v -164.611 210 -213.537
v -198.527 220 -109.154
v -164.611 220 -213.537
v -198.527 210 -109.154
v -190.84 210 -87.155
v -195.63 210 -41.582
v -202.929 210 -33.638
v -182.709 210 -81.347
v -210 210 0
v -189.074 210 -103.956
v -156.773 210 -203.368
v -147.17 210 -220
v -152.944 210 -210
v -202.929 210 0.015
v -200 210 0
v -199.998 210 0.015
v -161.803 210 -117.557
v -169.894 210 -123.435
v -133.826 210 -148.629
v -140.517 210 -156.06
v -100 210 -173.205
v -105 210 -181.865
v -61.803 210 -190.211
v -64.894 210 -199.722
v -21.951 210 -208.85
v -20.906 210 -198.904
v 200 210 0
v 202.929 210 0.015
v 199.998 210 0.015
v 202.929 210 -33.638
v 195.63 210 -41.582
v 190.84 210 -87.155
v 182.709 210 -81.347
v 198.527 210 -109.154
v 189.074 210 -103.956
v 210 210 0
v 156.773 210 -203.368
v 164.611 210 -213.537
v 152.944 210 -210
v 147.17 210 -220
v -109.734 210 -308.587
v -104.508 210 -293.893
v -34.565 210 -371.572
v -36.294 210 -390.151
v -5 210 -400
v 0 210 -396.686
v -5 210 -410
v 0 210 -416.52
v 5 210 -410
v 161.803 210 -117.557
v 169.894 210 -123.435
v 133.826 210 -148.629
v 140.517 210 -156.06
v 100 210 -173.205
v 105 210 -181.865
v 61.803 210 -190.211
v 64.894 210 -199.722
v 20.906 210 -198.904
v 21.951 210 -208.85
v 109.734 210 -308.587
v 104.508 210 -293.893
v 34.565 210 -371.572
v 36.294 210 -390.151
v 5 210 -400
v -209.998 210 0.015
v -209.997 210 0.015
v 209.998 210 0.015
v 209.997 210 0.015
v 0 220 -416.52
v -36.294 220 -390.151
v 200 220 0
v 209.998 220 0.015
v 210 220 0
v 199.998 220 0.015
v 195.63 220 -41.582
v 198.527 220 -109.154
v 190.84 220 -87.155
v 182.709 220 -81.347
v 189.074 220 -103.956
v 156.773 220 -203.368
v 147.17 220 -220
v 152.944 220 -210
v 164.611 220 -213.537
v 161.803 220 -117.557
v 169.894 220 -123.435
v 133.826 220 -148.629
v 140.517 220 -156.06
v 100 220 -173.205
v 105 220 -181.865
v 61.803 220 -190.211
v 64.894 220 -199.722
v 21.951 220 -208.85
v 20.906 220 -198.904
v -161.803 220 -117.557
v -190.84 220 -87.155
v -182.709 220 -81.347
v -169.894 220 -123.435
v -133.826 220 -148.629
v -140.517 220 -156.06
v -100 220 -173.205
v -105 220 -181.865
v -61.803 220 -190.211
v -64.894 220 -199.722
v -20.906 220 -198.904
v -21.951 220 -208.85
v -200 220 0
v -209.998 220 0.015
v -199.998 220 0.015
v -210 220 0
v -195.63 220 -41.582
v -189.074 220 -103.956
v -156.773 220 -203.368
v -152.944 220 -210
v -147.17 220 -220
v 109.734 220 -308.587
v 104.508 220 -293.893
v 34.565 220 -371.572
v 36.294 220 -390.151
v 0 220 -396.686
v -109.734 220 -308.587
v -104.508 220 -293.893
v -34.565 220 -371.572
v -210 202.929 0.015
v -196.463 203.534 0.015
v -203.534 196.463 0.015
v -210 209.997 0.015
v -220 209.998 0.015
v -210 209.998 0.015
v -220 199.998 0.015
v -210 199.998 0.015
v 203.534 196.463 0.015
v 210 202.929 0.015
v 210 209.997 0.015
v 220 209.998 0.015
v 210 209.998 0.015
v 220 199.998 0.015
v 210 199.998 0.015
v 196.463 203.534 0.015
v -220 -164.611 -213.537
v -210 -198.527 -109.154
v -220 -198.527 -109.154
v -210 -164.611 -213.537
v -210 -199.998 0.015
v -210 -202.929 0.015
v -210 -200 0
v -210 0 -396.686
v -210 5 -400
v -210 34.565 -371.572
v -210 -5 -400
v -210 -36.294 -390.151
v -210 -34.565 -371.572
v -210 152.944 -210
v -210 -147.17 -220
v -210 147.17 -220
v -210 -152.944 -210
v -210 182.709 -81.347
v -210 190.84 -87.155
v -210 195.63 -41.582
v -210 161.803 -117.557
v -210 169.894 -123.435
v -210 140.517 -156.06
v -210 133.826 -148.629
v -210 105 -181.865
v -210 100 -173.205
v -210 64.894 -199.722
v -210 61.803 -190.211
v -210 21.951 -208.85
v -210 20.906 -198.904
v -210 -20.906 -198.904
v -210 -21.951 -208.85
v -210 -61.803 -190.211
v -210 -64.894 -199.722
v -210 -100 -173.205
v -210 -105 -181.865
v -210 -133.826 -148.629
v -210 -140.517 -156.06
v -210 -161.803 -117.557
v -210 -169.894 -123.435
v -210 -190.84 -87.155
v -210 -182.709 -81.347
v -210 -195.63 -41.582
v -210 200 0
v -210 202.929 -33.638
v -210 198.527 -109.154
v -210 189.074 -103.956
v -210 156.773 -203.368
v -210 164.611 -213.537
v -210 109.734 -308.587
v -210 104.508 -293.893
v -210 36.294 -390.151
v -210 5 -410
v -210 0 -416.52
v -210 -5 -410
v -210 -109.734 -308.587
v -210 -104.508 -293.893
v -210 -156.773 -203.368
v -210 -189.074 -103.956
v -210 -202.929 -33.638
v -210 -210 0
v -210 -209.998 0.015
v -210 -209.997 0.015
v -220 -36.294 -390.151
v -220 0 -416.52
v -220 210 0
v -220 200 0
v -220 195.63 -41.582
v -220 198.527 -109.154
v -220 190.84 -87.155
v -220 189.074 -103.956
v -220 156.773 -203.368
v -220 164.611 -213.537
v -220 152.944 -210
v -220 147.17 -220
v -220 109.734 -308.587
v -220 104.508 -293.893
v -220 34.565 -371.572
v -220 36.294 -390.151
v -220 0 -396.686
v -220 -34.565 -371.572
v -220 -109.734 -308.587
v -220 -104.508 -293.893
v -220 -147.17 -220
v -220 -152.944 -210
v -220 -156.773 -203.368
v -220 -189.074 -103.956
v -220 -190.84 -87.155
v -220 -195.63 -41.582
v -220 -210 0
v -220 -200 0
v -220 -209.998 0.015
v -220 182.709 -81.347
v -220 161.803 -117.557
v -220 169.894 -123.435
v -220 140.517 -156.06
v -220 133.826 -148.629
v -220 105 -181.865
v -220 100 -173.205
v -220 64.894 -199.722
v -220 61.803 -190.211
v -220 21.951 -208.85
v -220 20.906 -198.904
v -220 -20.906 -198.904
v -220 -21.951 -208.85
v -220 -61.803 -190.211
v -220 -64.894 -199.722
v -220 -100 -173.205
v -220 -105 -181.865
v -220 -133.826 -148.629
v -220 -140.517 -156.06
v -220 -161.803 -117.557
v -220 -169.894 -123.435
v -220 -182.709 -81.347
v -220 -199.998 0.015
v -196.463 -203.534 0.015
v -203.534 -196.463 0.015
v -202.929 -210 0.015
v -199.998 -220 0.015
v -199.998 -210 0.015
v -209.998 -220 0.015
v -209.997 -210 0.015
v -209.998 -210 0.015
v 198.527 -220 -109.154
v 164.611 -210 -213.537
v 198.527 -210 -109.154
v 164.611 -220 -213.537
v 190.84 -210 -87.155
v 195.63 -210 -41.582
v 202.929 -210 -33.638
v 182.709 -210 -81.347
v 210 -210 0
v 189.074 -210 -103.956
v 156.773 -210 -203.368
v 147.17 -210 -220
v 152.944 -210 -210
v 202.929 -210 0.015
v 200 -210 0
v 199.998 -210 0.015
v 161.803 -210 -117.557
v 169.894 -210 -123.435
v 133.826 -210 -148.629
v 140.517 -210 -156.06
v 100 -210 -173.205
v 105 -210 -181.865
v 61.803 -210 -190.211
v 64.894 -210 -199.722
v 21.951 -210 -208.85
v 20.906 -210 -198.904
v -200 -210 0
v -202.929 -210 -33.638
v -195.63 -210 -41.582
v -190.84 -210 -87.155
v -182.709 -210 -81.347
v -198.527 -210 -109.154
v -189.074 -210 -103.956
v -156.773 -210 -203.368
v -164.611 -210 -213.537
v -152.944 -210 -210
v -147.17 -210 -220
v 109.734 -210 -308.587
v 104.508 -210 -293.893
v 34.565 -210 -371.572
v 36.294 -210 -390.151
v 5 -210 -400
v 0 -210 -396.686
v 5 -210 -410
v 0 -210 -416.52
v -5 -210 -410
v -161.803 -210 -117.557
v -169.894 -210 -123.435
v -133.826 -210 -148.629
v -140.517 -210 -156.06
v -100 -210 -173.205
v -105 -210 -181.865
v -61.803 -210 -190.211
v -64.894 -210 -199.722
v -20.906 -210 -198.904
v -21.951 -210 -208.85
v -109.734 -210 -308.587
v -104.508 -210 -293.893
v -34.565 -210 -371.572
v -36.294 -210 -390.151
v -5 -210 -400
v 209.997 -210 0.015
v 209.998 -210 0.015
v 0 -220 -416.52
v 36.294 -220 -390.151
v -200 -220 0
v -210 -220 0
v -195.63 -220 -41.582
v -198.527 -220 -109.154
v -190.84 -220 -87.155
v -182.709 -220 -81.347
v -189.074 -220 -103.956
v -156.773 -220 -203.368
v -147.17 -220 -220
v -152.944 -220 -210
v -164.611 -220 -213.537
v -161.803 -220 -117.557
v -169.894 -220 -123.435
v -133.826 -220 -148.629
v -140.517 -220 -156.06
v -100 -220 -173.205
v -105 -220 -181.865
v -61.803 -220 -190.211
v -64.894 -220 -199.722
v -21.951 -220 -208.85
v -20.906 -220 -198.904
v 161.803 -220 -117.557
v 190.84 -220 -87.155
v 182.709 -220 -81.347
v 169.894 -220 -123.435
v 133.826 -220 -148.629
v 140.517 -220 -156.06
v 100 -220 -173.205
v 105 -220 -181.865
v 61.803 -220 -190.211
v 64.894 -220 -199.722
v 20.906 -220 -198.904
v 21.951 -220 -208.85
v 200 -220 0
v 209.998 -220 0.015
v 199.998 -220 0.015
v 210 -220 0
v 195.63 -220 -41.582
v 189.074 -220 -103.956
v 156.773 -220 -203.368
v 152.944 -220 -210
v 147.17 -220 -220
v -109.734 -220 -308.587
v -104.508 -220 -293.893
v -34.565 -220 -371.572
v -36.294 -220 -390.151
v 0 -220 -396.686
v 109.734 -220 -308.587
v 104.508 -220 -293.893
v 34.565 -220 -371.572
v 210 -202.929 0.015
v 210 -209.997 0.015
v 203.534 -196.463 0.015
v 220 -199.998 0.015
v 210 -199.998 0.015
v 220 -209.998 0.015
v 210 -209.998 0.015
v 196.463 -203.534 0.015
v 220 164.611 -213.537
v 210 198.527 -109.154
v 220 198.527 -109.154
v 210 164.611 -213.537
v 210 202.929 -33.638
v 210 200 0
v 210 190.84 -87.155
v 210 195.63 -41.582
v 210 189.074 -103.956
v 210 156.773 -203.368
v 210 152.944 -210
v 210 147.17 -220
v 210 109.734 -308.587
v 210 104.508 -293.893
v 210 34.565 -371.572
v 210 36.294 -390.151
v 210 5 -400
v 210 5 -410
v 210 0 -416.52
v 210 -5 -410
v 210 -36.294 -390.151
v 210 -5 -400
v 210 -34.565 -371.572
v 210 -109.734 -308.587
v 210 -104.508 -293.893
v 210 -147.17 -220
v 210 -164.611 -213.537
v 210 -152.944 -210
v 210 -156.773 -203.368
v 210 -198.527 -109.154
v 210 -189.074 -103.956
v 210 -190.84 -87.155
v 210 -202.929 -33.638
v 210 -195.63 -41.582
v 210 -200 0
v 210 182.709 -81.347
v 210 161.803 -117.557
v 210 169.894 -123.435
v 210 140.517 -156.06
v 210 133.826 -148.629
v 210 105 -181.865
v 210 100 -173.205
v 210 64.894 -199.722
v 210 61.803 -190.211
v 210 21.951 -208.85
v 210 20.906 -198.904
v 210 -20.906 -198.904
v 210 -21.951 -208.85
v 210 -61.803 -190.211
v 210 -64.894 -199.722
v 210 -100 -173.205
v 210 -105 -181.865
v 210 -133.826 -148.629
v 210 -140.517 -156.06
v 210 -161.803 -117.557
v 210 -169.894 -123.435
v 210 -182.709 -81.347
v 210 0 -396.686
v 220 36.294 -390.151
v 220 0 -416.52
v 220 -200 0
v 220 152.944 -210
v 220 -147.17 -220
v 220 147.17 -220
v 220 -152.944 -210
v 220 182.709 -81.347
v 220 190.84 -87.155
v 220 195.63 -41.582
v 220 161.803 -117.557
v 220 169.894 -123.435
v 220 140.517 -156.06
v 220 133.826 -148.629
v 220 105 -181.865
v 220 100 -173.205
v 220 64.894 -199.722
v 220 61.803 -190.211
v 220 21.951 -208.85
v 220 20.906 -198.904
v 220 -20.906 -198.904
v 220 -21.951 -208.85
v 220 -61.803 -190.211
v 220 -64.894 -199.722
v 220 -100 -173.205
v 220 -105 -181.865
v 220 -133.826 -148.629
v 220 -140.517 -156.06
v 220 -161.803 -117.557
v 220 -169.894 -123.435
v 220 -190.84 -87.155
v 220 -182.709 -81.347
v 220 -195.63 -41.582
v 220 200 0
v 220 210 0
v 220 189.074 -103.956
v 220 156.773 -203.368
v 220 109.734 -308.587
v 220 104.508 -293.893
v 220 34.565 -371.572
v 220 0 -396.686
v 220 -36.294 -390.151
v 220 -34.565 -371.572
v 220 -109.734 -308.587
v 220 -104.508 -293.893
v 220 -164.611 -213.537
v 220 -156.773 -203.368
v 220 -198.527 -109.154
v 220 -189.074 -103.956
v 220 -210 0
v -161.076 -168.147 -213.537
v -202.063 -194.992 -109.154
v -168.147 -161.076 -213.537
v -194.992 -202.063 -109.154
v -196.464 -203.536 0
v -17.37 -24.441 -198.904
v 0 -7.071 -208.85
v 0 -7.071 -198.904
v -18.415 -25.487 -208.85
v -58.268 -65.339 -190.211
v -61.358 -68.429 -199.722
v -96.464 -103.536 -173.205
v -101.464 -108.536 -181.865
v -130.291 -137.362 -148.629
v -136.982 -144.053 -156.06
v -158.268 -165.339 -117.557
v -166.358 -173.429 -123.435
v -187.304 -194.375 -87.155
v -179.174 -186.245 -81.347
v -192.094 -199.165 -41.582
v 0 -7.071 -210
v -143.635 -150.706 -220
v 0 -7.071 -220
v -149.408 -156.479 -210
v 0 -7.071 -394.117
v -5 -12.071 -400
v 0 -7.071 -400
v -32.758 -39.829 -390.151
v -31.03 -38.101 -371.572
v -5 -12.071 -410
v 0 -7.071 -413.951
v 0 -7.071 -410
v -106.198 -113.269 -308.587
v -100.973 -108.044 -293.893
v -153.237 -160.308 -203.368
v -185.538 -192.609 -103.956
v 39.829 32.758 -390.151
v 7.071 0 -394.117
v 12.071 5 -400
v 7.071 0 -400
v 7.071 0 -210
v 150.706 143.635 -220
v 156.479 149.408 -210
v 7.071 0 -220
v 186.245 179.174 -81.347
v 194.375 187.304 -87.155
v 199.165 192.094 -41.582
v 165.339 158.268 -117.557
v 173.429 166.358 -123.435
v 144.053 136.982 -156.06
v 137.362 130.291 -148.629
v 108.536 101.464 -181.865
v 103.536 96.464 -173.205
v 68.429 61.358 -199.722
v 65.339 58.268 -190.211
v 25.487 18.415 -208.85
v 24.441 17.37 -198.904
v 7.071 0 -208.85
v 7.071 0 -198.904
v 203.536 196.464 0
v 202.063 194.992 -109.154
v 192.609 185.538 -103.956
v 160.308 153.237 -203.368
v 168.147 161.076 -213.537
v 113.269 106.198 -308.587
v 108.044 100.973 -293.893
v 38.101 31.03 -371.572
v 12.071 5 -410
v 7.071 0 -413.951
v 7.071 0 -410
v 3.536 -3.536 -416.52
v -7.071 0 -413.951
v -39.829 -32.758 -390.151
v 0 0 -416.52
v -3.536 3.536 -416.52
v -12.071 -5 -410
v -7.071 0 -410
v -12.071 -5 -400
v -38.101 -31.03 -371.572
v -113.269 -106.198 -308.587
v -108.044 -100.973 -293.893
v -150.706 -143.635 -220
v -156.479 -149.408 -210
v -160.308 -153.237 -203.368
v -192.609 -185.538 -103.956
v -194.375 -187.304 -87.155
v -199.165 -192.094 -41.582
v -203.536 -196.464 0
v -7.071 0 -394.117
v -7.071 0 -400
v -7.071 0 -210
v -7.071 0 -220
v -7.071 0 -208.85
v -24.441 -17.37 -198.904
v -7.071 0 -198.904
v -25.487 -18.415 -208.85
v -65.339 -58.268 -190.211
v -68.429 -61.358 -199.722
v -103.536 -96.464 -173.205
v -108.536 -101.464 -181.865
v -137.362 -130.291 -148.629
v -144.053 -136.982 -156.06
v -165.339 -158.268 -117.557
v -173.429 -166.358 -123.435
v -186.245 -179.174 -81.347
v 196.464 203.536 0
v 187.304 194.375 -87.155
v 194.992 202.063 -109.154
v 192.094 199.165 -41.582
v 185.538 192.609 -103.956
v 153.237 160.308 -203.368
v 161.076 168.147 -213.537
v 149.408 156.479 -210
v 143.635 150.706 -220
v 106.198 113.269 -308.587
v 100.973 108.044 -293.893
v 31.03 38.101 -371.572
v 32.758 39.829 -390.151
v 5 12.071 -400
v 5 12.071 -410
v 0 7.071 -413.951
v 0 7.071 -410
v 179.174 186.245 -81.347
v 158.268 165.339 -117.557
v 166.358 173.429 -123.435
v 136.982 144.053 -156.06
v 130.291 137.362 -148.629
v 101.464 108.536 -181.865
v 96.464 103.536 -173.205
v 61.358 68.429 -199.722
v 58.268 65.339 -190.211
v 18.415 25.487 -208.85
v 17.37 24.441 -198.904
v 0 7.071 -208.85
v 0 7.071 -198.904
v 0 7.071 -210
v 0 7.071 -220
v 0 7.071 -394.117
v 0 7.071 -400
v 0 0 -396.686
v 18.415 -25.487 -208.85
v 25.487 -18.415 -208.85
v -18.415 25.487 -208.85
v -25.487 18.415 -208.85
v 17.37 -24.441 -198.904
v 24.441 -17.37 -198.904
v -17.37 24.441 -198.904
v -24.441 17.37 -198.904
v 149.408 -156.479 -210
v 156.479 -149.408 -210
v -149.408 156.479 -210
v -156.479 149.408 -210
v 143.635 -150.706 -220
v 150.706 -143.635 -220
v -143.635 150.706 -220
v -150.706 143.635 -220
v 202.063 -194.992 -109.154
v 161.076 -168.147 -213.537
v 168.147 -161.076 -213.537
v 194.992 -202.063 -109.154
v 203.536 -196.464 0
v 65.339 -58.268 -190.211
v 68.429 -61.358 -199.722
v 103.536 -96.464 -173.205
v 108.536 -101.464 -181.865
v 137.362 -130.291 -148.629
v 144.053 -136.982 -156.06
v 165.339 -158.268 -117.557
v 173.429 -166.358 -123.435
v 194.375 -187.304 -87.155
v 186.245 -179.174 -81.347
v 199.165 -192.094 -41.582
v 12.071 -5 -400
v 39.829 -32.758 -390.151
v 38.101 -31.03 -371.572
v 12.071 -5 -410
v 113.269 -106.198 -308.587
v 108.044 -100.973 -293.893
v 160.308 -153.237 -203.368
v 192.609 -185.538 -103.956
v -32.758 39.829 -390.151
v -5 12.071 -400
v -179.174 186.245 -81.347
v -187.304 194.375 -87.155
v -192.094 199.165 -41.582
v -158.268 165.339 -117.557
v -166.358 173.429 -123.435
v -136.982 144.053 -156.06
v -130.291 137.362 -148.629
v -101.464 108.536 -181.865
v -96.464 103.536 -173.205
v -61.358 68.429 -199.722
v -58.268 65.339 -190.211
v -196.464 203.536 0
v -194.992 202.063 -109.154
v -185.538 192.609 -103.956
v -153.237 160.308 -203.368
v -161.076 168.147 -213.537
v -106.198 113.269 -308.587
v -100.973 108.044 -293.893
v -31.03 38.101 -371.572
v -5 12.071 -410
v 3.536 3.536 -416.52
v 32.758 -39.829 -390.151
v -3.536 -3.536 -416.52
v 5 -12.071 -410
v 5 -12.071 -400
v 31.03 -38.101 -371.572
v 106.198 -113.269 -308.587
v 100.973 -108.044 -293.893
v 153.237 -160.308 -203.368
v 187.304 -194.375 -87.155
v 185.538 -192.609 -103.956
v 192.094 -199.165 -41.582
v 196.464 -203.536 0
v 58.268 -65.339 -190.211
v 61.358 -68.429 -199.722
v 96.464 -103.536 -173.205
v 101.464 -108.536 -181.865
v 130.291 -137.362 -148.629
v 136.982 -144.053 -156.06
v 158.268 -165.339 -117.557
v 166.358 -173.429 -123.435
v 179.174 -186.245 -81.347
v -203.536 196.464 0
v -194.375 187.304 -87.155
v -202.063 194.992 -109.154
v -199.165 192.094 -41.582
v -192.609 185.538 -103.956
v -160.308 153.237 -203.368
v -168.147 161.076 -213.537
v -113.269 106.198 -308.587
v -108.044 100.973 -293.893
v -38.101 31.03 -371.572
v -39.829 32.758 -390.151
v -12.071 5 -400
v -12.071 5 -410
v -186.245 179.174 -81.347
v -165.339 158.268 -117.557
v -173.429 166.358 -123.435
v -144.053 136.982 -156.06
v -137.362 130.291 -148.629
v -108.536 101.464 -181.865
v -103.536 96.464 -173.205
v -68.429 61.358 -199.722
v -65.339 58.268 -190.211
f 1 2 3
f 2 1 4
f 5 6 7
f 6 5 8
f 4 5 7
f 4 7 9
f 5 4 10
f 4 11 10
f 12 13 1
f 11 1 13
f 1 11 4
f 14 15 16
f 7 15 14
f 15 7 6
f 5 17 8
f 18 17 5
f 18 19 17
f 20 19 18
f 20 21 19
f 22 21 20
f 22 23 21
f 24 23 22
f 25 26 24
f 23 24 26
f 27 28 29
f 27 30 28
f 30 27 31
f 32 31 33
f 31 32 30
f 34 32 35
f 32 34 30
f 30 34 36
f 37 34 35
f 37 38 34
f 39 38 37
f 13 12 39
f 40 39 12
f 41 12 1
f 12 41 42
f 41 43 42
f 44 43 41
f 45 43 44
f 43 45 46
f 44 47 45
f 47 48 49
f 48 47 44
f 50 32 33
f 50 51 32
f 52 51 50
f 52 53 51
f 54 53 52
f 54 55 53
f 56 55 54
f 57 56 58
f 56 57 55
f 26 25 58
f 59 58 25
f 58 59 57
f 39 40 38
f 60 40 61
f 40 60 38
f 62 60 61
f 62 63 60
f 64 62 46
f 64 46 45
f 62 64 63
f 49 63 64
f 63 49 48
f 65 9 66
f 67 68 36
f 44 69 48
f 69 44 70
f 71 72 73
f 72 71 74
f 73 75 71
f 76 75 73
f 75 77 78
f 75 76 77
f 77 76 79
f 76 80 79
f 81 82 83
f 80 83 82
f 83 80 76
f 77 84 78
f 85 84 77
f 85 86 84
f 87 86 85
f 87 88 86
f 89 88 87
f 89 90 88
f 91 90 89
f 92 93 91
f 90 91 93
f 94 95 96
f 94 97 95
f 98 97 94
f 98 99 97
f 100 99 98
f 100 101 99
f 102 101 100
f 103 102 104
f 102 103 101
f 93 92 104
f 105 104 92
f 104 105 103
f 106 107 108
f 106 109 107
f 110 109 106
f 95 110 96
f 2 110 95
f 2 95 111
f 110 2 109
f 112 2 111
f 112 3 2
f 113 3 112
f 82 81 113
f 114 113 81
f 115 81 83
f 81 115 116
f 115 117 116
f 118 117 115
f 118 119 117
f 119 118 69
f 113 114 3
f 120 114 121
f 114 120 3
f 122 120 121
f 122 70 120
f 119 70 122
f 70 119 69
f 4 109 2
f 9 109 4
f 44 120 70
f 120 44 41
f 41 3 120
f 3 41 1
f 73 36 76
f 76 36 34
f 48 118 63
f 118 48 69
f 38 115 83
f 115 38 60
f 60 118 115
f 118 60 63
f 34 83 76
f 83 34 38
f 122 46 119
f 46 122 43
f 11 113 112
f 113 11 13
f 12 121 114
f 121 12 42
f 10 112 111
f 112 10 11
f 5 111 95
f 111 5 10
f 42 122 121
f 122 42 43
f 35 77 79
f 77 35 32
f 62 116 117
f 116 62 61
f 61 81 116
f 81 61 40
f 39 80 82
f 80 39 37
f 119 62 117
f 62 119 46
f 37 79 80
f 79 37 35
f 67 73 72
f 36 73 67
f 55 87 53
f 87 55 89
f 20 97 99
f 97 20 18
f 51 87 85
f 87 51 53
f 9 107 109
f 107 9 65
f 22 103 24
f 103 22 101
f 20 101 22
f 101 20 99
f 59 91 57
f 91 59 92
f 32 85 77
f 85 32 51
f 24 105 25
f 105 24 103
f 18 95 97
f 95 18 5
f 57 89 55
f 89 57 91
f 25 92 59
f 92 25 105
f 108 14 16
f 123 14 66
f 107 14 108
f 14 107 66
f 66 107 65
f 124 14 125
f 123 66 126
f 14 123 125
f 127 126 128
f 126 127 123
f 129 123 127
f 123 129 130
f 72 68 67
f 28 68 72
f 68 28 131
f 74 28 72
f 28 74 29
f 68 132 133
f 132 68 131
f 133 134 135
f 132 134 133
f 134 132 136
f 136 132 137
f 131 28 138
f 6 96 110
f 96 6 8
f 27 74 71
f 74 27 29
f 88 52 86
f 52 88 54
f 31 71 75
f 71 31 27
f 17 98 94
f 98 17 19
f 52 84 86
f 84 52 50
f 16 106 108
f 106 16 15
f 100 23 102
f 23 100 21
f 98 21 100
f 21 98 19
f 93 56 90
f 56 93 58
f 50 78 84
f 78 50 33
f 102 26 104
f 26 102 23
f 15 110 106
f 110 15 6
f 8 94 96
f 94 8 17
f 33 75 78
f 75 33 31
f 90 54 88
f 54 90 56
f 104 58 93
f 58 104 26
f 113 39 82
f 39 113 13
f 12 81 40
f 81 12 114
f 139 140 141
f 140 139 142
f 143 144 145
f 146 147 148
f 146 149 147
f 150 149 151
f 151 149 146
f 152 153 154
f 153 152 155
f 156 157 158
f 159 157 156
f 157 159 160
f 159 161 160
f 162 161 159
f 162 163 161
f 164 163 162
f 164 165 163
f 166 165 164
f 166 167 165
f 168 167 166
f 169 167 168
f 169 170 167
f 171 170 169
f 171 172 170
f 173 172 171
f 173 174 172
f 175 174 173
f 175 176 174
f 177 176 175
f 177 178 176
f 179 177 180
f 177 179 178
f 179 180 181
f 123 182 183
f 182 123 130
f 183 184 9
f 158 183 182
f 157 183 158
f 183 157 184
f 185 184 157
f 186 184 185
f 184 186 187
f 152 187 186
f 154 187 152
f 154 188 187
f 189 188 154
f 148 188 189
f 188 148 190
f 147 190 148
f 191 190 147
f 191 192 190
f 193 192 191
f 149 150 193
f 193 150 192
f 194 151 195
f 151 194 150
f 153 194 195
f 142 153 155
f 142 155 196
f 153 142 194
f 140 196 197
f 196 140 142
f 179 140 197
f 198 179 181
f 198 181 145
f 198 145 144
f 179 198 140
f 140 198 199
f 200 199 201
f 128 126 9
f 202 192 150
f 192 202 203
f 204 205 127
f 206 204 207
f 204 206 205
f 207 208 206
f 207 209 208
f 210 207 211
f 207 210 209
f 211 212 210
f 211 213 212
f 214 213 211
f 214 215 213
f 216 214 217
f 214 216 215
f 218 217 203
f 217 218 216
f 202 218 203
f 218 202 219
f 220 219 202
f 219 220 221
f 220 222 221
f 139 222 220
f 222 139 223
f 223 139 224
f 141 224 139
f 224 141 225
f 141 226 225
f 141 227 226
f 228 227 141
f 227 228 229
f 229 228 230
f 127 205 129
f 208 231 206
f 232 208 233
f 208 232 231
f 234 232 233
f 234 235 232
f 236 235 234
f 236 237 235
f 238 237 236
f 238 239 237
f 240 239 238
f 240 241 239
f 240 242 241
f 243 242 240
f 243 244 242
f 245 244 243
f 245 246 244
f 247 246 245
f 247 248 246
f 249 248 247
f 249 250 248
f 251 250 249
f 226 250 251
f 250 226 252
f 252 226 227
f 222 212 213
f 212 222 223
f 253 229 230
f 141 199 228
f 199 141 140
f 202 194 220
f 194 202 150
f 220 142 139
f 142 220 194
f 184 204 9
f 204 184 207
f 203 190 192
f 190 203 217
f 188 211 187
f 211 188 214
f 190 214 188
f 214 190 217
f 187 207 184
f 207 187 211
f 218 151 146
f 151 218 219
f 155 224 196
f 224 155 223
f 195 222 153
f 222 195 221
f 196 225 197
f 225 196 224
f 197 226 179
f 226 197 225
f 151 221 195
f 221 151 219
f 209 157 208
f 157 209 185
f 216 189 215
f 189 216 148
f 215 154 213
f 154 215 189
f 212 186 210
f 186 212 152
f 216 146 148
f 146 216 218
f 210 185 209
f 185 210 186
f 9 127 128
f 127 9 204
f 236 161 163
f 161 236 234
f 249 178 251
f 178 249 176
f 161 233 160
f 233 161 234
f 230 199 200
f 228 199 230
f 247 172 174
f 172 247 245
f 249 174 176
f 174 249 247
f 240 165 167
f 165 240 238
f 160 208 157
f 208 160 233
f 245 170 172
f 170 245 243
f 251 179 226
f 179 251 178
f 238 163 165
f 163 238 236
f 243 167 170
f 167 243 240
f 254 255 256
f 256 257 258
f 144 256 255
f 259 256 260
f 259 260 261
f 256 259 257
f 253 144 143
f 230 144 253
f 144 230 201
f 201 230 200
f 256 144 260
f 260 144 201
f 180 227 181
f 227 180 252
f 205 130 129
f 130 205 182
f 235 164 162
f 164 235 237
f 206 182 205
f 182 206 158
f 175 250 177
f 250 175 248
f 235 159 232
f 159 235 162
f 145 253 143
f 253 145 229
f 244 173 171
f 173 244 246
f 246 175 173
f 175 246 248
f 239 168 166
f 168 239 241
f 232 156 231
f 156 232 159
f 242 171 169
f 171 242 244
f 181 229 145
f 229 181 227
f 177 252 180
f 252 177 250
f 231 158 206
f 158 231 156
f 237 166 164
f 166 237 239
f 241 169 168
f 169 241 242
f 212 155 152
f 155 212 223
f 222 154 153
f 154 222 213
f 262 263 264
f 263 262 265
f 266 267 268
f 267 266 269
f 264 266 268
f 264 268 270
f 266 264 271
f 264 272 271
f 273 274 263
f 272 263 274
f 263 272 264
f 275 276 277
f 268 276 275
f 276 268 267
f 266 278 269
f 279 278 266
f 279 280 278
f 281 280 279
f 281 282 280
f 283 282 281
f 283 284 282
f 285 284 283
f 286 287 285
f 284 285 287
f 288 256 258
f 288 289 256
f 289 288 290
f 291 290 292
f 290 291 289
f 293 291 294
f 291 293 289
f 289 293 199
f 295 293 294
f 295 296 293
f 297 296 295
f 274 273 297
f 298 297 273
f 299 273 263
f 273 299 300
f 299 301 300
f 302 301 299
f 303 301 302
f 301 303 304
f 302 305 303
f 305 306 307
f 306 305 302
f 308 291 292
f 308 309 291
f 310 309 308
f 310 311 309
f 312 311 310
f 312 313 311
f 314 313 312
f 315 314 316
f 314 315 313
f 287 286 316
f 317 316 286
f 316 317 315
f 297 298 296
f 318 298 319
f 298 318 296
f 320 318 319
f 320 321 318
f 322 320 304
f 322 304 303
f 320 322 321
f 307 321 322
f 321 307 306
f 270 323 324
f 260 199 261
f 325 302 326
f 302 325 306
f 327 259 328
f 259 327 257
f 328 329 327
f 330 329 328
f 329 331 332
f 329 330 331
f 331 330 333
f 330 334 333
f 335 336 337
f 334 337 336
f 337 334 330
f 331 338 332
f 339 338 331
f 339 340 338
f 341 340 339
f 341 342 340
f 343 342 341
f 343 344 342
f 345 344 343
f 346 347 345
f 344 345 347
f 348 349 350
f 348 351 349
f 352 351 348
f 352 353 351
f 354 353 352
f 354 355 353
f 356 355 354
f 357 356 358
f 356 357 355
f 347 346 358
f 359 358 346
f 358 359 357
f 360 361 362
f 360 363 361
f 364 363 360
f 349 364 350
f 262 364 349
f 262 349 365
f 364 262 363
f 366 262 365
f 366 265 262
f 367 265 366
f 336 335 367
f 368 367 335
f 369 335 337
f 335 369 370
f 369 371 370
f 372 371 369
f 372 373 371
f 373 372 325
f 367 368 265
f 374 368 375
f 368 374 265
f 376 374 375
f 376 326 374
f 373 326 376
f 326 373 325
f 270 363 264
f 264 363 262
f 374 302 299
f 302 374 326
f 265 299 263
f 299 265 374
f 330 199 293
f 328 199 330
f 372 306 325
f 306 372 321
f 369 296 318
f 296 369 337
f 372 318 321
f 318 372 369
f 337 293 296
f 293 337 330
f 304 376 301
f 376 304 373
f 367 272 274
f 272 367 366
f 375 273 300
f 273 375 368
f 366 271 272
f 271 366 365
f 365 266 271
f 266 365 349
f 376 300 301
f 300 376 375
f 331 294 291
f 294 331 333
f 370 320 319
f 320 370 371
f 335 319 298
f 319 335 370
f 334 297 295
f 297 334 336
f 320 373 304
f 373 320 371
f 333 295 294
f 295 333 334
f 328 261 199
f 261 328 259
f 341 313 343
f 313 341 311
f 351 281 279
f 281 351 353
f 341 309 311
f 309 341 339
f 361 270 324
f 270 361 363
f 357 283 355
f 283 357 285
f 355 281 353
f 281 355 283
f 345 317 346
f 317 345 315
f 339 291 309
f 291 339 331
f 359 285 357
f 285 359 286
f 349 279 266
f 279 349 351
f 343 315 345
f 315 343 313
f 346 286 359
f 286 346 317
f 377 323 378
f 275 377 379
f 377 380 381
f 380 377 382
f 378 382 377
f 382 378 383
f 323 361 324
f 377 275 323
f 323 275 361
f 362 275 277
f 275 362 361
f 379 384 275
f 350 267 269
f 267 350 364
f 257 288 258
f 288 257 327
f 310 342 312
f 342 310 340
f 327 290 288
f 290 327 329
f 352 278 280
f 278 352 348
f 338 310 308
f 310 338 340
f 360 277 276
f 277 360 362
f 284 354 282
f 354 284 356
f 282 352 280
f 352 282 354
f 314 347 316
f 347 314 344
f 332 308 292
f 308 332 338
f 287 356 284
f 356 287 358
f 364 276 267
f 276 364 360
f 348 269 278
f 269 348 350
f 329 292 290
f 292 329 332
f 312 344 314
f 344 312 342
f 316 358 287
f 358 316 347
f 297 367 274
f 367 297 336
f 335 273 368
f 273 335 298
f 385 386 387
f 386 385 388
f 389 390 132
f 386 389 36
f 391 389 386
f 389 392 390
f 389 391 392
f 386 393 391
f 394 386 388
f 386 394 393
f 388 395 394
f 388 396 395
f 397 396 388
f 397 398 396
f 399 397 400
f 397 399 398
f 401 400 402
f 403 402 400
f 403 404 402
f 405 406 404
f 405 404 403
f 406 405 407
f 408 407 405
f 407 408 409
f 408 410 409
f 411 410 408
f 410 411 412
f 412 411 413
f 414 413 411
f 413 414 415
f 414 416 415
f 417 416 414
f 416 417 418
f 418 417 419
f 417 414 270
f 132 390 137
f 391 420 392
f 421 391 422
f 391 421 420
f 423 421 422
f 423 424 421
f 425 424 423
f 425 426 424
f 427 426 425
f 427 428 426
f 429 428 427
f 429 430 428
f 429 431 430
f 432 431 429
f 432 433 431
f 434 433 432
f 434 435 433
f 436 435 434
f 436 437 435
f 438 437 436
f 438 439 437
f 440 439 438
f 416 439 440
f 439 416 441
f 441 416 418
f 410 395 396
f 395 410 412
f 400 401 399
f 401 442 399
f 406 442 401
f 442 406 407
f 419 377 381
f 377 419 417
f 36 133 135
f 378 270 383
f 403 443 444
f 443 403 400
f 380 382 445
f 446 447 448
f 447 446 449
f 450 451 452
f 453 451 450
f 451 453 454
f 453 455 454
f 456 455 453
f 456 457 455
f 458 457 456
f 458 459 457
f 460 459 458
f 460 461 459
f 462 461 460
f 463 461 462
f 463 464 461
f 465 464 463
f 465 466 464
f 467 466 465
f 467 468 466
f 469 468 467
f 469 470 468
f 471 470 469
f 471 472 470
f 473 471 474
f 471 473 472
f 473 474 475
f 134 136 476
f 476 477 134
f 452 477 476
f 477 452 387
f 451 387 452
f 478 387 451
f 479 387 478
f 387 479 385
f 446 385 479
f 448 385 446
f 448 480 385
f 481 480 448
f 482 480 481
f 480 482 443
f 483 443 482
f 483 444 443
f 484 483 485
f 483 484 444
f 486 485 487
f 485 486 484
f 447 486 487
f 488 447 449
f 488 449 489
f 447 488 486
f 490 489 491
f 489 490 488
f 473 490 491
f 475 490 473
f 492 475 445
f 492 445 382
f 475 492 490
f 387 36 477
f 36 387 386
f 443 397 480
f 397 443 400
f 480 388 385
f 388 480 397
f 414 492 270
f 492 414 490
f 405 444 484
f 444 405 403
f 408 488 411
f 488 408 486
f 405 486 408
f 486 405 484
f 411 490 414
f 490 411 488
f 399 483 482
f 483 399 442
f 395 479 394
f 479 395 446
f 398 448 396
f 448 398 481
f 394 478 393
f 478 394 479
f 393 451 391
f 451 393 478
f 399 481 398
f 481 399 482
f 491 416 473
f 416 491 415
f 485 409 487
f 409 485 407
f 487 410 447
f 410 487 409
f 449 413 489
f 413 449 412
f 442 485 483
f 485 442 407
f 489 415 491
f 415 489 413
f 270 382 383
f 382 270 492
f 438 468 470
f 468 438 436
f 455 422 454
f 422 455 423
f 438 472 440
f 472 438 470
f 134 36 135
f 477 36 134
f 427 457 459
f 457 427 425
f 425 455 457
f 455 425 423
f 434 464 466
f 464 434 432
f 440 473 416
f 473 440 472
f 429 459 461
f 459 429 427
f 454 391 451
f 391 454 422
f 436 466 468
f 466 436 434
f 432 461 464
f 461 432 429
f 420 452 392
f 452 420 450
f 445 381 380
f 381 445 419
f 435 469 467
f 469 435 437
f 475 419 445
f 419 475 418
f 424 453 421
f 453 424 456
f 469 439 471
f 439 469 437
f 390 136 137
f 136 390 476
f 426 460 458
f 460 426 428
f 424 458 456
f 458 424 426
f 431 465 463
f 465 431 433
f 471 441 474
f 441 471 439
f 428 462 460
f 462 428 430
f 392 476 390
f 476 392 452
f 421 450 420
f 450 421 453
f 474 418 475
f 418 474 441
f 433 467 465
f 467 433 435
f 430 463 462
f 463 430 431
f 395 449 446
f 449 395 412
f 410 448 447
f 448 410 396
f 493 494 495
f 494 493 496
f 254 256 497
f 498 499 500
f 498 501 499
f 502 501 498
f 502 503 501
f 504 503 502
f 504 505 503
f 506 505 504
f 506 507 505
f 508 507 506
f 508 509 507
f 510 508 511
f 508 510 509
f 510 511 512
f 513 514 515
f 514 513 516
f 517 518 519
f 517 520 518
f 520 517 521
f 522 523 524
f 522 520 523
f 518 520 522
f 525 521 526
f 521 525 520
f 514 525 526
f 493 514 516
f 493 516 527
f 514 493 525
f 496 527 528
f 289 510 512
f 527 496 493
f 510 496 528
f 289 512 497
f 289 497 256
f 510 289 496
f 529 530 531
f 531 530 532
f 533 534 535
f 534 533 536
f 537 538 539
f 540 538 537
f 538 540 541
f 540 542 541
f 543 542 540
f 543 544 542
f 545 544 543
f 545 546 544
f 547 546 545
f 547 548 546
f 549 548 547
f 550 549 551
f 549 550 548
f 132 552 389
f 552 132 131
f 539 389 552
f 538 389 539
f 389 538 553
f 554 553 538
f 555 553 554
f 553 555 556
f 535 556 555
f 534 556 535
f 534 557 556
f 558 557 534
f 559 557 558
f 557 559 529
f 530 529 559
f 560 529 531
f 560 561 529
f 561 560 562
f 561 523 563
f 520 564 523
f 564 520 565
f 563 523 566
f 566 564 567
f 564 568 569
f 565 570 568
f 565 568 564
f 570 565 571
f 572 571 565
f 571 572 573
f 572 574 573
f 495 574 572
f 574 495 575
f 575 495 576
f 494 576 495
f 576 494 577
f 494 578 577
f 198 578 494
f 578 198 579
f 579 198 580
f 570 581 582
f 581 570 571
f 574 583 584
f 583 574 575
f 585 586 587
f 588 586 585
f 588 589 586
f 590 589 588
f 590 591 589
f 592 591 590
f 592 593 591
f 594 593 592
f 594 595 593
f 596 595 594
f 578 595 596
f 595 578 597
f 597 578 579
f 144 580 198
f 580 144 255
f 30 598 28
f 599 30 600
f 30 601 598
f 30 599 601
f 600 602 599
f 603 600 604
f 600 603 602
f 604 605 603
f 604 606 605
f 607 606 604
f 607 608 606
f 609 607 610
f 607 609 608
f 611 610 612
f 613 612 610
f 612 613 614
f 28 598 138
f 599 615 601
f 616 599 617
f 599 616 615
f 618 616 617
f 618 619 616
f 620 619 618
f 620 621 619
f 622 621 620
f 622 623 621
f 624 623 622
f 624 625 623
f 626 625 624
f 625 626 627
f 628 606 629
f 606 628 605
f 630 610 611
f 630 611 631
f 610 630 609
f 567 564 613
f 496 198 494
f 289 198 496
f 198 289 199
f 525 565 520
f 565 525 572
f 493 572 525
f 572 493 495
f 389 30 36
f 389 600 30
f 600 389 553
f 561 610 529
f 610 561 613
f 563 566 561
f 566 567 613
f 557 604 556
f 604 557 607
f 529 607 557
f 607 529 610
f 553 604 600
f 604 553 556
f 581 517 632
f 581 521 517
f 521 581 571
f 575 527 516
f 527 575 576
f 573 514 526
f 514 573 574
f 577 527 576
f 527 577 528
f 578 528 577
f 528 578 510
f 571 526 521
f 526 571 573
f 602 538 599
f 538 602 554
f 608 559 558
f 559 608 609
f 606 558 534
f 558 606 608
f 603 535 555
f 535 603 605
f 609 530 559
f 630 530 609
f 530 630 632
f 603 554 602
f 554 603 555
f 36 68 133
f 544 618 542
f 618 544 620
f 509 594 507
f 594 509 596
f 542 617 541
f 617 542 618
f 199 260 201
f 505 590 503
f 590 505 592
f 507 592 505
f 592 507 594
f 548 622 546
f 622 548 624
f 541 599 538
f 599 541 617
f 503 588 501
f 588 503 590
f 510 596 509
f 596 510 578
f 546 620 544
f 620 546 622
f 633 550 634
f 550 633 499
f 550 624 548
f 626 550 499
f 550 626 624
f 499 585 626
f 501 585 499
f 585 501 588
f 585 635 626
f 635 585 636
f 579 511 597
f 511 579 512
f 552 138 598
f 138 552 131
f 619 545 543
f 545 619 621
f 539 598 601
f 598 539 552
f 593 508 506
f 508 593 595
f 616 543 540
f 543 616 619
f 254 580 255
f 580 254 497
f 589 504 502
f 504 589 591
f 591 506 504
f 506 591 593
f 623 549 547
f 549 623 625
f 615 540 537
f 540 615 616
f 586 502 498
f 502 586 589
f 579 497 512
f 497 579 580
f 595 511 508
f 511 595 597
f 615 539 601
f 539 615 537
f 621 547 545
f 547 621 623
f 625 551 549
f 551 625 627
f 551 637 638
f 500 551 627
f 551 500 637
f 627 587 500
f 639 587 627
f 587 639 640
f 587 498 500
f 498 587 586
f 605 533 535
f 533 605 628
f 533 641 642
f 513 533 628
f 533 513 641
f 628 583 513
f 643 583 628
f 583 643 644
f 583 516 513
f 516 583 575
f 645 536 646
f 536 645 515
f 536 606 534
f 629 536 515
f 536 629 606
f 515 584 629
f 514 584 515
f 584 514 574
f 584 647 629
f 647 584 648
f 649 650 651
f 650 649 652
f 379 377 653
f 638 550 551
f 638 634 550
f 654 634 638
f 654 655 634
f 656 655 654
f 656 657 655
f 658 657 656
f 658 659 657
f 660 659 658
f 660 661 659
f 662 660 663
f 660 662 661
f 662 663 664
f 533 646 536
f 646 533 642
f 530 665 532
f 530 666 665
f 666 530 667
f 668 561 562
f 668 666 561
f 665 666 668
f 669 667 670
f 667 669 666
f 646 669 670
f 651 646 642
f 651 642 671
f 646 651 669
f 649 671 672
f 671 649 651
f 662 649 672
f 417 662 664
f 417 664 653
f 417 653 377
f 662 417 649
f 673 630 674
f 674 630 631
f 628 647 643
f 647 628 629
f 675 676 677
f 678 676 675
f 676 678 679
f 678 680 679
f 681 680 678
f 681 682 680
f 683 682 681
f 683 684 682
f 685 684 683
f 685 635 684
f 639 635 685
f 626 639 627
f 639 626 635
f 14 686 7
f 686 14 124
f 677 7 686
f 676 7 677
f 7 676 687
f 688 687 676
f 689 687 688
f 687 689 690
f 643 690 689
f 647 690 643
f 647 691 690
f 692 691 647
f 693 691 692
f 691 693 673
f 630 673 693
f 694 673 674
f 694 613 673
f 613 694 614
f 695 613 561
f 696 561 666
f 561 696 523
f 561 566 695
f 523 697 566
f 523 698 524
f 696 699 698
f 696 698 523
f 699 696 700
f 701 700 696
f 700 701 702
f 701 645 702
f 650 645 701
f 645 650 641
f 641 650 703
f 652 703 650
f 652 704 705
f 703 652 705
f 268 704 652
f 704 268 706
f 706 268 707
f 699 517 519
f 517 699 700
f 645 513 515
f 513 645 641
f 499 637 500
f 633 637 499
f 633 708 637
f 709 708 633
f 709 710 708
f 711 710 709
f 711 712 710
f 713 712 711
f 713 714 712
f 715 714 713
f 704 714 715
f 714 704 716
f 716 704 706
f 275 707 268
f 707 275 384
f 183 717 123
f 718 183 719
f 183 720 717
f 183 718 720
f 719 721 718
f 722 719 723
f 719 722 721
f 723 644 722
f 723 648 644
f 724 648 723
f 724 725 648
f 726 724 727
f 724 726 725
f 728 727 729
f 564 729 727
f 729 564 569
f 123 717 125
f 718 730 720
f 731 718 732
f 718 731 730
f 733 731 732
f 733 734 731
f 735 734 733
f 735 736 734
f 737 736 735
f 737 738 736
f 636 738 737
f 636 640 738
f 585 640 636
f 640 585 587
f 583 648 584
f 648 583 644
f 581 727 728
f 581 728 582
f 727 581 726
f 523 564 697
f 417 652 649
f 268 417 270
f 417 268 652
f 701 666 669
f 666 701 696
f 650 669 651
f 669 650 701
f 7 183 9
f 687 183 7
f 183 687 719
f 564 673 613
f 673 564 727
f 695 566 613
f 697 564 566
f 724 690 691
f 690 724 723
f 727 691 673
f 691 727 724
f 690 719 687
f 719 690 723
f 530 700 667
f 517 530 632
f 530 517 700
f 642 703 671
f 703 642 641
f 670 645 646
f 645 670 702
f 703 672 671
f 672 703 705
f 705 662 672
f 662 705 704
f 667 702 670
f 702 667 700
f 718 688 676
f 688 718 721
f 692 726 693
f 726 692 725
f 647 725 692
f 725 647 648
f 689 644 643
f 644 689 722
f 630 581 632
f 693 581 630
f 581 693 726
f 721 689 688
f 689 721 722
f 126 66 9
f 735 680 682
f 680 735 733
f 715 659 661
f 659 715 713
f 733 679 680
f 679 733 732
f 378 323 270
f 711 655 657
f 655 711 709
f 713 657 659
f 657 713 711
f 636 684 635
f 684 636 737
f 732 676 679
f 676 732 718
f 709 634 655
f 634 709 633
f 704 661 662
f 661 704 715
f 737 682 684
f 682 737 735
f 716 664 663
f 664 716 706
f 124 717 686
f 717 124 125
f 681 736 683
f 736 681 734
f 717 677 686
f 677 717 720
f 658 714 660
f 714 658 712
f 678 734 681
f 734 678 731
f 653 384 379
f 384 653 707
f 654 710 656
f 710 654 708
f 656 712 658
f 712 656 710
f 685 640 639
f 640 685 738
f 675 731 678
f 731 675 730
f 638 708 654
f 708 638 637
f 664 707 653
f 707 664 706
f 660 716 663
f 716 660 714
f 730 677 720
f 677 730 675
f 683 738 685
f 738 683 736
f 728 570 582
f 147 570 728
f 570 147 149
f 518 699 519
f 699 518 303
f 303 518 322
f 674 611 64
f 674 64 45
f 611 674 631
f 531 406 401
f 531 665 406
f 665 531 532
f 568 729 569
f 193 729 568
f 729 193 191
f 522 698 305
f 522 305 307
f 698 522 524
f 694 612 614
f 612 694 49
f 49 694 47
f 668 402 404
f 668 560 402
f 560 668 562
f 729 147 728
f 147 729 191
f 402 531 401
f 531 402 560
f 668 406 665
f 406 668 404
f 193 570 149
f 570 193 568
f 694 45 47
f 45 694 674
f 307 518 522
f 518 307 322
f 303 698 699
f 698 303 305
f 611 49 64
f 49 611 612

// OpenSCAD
// Copyright 2013 Jonathan Hulka
// This program is free software; you can redistribute it and/or modify
// it under the terms of the GNU General Public License as published by
// the Free Software Foundation; either version 2 of the License, or
// (at your option) any later version.
// 
// This program is distributed in the hope that it will be useful,
// but WITHOUT ANY WARRANTY; without even the implied warranty of
// MERCHANTABILITY or FITNESS FOR A PARTICULAR PURPOSE.  See the
// GNU General Public License for more details.
// 
// You should have received a copy of the GNU General Public License
// along with this program; if not, write to the Free Software
// Foundation, Inc., 51 Franklin Street, Fifth Floor, Boston,
// MA 02110-1301, USA.

module gothic_arch(width,depth)
{
	radius=width*5/4;
	rotate([90,0,0])intersection()
	{
		translate([radius-width/2,0,0])cylinder(h=depth,r=radius,center=true);
		translate([width/2-radius,0,0])cylinder(h=depth,r=radius,center=true);
		translate([0,-width/2-1,0])cube(size=[width+1,width+2,depth+1],center=true);
	}
}
module round_arch(width,depth)
{
	rotate([90,0,0])intersection()
	{
		cylinder(h=depth,r=width/2,center=true);
		//This will be used to cut out of the larger piece, so it extends down 0.01mm
		translate([0,-width/2-0.99,0])cube(size=[width+1,width+2.01,depth+1],center=true);
	}
}

module solid_structure(width)
{
	difference()
	{
		union()
		{
			rotate([0,0,90])gothic_arch(width+20,width+40);
			gothic_arch(width+20,width+40);
		}
		union()
		{
			rotate([0,0,90])round_arch(width,width+50);
			round_arch(width,width+50);
		}
		intersection()
		{
			union()
			{
				rotate([0,0,90])gothic_arch(width,width+50);
				gothic_arch(width,width+50);
			}
			translate([0,0,-width-40])cube(size=width+60,center=true);
		}
	}
}

module beam(width,thickness)
{
	union()
	{
		difference()
		{
			gothic_arch(width+thickness*2,thickness);
			gothic_arch(width,thickness+1);
		}
		difference()
		{
			round_arch(width+thickness*2,thickness);
			round_arch(width,thickness+1);
		}
		intersection()
		{
			gothic_arch(width+thickness*2,thickness);
			translate([0,0,-width/2-thickness*3/2]) cube(size=[width,thickness,thickness],center=true);
		}
	}
}
module draw_beams()
{
w=400;
t=10;
union()
{
	for(i=[0:3])
	{
		rotate([0,0,90*i])
		{
			translate([0,w/2+t*3/2,0]) beam(w,t);
		}
	}
	for(i=[0:1])
	{
		rotate([0,0,45+90*i]) scale([sqrt(2),1,1]) beam(w,t);
		rotate([0,0,90*i]) translate([0,0,-w-t/2]) cube(size=[w+t*4,t,t],center=true);
	}
}
}
draw_beams();
